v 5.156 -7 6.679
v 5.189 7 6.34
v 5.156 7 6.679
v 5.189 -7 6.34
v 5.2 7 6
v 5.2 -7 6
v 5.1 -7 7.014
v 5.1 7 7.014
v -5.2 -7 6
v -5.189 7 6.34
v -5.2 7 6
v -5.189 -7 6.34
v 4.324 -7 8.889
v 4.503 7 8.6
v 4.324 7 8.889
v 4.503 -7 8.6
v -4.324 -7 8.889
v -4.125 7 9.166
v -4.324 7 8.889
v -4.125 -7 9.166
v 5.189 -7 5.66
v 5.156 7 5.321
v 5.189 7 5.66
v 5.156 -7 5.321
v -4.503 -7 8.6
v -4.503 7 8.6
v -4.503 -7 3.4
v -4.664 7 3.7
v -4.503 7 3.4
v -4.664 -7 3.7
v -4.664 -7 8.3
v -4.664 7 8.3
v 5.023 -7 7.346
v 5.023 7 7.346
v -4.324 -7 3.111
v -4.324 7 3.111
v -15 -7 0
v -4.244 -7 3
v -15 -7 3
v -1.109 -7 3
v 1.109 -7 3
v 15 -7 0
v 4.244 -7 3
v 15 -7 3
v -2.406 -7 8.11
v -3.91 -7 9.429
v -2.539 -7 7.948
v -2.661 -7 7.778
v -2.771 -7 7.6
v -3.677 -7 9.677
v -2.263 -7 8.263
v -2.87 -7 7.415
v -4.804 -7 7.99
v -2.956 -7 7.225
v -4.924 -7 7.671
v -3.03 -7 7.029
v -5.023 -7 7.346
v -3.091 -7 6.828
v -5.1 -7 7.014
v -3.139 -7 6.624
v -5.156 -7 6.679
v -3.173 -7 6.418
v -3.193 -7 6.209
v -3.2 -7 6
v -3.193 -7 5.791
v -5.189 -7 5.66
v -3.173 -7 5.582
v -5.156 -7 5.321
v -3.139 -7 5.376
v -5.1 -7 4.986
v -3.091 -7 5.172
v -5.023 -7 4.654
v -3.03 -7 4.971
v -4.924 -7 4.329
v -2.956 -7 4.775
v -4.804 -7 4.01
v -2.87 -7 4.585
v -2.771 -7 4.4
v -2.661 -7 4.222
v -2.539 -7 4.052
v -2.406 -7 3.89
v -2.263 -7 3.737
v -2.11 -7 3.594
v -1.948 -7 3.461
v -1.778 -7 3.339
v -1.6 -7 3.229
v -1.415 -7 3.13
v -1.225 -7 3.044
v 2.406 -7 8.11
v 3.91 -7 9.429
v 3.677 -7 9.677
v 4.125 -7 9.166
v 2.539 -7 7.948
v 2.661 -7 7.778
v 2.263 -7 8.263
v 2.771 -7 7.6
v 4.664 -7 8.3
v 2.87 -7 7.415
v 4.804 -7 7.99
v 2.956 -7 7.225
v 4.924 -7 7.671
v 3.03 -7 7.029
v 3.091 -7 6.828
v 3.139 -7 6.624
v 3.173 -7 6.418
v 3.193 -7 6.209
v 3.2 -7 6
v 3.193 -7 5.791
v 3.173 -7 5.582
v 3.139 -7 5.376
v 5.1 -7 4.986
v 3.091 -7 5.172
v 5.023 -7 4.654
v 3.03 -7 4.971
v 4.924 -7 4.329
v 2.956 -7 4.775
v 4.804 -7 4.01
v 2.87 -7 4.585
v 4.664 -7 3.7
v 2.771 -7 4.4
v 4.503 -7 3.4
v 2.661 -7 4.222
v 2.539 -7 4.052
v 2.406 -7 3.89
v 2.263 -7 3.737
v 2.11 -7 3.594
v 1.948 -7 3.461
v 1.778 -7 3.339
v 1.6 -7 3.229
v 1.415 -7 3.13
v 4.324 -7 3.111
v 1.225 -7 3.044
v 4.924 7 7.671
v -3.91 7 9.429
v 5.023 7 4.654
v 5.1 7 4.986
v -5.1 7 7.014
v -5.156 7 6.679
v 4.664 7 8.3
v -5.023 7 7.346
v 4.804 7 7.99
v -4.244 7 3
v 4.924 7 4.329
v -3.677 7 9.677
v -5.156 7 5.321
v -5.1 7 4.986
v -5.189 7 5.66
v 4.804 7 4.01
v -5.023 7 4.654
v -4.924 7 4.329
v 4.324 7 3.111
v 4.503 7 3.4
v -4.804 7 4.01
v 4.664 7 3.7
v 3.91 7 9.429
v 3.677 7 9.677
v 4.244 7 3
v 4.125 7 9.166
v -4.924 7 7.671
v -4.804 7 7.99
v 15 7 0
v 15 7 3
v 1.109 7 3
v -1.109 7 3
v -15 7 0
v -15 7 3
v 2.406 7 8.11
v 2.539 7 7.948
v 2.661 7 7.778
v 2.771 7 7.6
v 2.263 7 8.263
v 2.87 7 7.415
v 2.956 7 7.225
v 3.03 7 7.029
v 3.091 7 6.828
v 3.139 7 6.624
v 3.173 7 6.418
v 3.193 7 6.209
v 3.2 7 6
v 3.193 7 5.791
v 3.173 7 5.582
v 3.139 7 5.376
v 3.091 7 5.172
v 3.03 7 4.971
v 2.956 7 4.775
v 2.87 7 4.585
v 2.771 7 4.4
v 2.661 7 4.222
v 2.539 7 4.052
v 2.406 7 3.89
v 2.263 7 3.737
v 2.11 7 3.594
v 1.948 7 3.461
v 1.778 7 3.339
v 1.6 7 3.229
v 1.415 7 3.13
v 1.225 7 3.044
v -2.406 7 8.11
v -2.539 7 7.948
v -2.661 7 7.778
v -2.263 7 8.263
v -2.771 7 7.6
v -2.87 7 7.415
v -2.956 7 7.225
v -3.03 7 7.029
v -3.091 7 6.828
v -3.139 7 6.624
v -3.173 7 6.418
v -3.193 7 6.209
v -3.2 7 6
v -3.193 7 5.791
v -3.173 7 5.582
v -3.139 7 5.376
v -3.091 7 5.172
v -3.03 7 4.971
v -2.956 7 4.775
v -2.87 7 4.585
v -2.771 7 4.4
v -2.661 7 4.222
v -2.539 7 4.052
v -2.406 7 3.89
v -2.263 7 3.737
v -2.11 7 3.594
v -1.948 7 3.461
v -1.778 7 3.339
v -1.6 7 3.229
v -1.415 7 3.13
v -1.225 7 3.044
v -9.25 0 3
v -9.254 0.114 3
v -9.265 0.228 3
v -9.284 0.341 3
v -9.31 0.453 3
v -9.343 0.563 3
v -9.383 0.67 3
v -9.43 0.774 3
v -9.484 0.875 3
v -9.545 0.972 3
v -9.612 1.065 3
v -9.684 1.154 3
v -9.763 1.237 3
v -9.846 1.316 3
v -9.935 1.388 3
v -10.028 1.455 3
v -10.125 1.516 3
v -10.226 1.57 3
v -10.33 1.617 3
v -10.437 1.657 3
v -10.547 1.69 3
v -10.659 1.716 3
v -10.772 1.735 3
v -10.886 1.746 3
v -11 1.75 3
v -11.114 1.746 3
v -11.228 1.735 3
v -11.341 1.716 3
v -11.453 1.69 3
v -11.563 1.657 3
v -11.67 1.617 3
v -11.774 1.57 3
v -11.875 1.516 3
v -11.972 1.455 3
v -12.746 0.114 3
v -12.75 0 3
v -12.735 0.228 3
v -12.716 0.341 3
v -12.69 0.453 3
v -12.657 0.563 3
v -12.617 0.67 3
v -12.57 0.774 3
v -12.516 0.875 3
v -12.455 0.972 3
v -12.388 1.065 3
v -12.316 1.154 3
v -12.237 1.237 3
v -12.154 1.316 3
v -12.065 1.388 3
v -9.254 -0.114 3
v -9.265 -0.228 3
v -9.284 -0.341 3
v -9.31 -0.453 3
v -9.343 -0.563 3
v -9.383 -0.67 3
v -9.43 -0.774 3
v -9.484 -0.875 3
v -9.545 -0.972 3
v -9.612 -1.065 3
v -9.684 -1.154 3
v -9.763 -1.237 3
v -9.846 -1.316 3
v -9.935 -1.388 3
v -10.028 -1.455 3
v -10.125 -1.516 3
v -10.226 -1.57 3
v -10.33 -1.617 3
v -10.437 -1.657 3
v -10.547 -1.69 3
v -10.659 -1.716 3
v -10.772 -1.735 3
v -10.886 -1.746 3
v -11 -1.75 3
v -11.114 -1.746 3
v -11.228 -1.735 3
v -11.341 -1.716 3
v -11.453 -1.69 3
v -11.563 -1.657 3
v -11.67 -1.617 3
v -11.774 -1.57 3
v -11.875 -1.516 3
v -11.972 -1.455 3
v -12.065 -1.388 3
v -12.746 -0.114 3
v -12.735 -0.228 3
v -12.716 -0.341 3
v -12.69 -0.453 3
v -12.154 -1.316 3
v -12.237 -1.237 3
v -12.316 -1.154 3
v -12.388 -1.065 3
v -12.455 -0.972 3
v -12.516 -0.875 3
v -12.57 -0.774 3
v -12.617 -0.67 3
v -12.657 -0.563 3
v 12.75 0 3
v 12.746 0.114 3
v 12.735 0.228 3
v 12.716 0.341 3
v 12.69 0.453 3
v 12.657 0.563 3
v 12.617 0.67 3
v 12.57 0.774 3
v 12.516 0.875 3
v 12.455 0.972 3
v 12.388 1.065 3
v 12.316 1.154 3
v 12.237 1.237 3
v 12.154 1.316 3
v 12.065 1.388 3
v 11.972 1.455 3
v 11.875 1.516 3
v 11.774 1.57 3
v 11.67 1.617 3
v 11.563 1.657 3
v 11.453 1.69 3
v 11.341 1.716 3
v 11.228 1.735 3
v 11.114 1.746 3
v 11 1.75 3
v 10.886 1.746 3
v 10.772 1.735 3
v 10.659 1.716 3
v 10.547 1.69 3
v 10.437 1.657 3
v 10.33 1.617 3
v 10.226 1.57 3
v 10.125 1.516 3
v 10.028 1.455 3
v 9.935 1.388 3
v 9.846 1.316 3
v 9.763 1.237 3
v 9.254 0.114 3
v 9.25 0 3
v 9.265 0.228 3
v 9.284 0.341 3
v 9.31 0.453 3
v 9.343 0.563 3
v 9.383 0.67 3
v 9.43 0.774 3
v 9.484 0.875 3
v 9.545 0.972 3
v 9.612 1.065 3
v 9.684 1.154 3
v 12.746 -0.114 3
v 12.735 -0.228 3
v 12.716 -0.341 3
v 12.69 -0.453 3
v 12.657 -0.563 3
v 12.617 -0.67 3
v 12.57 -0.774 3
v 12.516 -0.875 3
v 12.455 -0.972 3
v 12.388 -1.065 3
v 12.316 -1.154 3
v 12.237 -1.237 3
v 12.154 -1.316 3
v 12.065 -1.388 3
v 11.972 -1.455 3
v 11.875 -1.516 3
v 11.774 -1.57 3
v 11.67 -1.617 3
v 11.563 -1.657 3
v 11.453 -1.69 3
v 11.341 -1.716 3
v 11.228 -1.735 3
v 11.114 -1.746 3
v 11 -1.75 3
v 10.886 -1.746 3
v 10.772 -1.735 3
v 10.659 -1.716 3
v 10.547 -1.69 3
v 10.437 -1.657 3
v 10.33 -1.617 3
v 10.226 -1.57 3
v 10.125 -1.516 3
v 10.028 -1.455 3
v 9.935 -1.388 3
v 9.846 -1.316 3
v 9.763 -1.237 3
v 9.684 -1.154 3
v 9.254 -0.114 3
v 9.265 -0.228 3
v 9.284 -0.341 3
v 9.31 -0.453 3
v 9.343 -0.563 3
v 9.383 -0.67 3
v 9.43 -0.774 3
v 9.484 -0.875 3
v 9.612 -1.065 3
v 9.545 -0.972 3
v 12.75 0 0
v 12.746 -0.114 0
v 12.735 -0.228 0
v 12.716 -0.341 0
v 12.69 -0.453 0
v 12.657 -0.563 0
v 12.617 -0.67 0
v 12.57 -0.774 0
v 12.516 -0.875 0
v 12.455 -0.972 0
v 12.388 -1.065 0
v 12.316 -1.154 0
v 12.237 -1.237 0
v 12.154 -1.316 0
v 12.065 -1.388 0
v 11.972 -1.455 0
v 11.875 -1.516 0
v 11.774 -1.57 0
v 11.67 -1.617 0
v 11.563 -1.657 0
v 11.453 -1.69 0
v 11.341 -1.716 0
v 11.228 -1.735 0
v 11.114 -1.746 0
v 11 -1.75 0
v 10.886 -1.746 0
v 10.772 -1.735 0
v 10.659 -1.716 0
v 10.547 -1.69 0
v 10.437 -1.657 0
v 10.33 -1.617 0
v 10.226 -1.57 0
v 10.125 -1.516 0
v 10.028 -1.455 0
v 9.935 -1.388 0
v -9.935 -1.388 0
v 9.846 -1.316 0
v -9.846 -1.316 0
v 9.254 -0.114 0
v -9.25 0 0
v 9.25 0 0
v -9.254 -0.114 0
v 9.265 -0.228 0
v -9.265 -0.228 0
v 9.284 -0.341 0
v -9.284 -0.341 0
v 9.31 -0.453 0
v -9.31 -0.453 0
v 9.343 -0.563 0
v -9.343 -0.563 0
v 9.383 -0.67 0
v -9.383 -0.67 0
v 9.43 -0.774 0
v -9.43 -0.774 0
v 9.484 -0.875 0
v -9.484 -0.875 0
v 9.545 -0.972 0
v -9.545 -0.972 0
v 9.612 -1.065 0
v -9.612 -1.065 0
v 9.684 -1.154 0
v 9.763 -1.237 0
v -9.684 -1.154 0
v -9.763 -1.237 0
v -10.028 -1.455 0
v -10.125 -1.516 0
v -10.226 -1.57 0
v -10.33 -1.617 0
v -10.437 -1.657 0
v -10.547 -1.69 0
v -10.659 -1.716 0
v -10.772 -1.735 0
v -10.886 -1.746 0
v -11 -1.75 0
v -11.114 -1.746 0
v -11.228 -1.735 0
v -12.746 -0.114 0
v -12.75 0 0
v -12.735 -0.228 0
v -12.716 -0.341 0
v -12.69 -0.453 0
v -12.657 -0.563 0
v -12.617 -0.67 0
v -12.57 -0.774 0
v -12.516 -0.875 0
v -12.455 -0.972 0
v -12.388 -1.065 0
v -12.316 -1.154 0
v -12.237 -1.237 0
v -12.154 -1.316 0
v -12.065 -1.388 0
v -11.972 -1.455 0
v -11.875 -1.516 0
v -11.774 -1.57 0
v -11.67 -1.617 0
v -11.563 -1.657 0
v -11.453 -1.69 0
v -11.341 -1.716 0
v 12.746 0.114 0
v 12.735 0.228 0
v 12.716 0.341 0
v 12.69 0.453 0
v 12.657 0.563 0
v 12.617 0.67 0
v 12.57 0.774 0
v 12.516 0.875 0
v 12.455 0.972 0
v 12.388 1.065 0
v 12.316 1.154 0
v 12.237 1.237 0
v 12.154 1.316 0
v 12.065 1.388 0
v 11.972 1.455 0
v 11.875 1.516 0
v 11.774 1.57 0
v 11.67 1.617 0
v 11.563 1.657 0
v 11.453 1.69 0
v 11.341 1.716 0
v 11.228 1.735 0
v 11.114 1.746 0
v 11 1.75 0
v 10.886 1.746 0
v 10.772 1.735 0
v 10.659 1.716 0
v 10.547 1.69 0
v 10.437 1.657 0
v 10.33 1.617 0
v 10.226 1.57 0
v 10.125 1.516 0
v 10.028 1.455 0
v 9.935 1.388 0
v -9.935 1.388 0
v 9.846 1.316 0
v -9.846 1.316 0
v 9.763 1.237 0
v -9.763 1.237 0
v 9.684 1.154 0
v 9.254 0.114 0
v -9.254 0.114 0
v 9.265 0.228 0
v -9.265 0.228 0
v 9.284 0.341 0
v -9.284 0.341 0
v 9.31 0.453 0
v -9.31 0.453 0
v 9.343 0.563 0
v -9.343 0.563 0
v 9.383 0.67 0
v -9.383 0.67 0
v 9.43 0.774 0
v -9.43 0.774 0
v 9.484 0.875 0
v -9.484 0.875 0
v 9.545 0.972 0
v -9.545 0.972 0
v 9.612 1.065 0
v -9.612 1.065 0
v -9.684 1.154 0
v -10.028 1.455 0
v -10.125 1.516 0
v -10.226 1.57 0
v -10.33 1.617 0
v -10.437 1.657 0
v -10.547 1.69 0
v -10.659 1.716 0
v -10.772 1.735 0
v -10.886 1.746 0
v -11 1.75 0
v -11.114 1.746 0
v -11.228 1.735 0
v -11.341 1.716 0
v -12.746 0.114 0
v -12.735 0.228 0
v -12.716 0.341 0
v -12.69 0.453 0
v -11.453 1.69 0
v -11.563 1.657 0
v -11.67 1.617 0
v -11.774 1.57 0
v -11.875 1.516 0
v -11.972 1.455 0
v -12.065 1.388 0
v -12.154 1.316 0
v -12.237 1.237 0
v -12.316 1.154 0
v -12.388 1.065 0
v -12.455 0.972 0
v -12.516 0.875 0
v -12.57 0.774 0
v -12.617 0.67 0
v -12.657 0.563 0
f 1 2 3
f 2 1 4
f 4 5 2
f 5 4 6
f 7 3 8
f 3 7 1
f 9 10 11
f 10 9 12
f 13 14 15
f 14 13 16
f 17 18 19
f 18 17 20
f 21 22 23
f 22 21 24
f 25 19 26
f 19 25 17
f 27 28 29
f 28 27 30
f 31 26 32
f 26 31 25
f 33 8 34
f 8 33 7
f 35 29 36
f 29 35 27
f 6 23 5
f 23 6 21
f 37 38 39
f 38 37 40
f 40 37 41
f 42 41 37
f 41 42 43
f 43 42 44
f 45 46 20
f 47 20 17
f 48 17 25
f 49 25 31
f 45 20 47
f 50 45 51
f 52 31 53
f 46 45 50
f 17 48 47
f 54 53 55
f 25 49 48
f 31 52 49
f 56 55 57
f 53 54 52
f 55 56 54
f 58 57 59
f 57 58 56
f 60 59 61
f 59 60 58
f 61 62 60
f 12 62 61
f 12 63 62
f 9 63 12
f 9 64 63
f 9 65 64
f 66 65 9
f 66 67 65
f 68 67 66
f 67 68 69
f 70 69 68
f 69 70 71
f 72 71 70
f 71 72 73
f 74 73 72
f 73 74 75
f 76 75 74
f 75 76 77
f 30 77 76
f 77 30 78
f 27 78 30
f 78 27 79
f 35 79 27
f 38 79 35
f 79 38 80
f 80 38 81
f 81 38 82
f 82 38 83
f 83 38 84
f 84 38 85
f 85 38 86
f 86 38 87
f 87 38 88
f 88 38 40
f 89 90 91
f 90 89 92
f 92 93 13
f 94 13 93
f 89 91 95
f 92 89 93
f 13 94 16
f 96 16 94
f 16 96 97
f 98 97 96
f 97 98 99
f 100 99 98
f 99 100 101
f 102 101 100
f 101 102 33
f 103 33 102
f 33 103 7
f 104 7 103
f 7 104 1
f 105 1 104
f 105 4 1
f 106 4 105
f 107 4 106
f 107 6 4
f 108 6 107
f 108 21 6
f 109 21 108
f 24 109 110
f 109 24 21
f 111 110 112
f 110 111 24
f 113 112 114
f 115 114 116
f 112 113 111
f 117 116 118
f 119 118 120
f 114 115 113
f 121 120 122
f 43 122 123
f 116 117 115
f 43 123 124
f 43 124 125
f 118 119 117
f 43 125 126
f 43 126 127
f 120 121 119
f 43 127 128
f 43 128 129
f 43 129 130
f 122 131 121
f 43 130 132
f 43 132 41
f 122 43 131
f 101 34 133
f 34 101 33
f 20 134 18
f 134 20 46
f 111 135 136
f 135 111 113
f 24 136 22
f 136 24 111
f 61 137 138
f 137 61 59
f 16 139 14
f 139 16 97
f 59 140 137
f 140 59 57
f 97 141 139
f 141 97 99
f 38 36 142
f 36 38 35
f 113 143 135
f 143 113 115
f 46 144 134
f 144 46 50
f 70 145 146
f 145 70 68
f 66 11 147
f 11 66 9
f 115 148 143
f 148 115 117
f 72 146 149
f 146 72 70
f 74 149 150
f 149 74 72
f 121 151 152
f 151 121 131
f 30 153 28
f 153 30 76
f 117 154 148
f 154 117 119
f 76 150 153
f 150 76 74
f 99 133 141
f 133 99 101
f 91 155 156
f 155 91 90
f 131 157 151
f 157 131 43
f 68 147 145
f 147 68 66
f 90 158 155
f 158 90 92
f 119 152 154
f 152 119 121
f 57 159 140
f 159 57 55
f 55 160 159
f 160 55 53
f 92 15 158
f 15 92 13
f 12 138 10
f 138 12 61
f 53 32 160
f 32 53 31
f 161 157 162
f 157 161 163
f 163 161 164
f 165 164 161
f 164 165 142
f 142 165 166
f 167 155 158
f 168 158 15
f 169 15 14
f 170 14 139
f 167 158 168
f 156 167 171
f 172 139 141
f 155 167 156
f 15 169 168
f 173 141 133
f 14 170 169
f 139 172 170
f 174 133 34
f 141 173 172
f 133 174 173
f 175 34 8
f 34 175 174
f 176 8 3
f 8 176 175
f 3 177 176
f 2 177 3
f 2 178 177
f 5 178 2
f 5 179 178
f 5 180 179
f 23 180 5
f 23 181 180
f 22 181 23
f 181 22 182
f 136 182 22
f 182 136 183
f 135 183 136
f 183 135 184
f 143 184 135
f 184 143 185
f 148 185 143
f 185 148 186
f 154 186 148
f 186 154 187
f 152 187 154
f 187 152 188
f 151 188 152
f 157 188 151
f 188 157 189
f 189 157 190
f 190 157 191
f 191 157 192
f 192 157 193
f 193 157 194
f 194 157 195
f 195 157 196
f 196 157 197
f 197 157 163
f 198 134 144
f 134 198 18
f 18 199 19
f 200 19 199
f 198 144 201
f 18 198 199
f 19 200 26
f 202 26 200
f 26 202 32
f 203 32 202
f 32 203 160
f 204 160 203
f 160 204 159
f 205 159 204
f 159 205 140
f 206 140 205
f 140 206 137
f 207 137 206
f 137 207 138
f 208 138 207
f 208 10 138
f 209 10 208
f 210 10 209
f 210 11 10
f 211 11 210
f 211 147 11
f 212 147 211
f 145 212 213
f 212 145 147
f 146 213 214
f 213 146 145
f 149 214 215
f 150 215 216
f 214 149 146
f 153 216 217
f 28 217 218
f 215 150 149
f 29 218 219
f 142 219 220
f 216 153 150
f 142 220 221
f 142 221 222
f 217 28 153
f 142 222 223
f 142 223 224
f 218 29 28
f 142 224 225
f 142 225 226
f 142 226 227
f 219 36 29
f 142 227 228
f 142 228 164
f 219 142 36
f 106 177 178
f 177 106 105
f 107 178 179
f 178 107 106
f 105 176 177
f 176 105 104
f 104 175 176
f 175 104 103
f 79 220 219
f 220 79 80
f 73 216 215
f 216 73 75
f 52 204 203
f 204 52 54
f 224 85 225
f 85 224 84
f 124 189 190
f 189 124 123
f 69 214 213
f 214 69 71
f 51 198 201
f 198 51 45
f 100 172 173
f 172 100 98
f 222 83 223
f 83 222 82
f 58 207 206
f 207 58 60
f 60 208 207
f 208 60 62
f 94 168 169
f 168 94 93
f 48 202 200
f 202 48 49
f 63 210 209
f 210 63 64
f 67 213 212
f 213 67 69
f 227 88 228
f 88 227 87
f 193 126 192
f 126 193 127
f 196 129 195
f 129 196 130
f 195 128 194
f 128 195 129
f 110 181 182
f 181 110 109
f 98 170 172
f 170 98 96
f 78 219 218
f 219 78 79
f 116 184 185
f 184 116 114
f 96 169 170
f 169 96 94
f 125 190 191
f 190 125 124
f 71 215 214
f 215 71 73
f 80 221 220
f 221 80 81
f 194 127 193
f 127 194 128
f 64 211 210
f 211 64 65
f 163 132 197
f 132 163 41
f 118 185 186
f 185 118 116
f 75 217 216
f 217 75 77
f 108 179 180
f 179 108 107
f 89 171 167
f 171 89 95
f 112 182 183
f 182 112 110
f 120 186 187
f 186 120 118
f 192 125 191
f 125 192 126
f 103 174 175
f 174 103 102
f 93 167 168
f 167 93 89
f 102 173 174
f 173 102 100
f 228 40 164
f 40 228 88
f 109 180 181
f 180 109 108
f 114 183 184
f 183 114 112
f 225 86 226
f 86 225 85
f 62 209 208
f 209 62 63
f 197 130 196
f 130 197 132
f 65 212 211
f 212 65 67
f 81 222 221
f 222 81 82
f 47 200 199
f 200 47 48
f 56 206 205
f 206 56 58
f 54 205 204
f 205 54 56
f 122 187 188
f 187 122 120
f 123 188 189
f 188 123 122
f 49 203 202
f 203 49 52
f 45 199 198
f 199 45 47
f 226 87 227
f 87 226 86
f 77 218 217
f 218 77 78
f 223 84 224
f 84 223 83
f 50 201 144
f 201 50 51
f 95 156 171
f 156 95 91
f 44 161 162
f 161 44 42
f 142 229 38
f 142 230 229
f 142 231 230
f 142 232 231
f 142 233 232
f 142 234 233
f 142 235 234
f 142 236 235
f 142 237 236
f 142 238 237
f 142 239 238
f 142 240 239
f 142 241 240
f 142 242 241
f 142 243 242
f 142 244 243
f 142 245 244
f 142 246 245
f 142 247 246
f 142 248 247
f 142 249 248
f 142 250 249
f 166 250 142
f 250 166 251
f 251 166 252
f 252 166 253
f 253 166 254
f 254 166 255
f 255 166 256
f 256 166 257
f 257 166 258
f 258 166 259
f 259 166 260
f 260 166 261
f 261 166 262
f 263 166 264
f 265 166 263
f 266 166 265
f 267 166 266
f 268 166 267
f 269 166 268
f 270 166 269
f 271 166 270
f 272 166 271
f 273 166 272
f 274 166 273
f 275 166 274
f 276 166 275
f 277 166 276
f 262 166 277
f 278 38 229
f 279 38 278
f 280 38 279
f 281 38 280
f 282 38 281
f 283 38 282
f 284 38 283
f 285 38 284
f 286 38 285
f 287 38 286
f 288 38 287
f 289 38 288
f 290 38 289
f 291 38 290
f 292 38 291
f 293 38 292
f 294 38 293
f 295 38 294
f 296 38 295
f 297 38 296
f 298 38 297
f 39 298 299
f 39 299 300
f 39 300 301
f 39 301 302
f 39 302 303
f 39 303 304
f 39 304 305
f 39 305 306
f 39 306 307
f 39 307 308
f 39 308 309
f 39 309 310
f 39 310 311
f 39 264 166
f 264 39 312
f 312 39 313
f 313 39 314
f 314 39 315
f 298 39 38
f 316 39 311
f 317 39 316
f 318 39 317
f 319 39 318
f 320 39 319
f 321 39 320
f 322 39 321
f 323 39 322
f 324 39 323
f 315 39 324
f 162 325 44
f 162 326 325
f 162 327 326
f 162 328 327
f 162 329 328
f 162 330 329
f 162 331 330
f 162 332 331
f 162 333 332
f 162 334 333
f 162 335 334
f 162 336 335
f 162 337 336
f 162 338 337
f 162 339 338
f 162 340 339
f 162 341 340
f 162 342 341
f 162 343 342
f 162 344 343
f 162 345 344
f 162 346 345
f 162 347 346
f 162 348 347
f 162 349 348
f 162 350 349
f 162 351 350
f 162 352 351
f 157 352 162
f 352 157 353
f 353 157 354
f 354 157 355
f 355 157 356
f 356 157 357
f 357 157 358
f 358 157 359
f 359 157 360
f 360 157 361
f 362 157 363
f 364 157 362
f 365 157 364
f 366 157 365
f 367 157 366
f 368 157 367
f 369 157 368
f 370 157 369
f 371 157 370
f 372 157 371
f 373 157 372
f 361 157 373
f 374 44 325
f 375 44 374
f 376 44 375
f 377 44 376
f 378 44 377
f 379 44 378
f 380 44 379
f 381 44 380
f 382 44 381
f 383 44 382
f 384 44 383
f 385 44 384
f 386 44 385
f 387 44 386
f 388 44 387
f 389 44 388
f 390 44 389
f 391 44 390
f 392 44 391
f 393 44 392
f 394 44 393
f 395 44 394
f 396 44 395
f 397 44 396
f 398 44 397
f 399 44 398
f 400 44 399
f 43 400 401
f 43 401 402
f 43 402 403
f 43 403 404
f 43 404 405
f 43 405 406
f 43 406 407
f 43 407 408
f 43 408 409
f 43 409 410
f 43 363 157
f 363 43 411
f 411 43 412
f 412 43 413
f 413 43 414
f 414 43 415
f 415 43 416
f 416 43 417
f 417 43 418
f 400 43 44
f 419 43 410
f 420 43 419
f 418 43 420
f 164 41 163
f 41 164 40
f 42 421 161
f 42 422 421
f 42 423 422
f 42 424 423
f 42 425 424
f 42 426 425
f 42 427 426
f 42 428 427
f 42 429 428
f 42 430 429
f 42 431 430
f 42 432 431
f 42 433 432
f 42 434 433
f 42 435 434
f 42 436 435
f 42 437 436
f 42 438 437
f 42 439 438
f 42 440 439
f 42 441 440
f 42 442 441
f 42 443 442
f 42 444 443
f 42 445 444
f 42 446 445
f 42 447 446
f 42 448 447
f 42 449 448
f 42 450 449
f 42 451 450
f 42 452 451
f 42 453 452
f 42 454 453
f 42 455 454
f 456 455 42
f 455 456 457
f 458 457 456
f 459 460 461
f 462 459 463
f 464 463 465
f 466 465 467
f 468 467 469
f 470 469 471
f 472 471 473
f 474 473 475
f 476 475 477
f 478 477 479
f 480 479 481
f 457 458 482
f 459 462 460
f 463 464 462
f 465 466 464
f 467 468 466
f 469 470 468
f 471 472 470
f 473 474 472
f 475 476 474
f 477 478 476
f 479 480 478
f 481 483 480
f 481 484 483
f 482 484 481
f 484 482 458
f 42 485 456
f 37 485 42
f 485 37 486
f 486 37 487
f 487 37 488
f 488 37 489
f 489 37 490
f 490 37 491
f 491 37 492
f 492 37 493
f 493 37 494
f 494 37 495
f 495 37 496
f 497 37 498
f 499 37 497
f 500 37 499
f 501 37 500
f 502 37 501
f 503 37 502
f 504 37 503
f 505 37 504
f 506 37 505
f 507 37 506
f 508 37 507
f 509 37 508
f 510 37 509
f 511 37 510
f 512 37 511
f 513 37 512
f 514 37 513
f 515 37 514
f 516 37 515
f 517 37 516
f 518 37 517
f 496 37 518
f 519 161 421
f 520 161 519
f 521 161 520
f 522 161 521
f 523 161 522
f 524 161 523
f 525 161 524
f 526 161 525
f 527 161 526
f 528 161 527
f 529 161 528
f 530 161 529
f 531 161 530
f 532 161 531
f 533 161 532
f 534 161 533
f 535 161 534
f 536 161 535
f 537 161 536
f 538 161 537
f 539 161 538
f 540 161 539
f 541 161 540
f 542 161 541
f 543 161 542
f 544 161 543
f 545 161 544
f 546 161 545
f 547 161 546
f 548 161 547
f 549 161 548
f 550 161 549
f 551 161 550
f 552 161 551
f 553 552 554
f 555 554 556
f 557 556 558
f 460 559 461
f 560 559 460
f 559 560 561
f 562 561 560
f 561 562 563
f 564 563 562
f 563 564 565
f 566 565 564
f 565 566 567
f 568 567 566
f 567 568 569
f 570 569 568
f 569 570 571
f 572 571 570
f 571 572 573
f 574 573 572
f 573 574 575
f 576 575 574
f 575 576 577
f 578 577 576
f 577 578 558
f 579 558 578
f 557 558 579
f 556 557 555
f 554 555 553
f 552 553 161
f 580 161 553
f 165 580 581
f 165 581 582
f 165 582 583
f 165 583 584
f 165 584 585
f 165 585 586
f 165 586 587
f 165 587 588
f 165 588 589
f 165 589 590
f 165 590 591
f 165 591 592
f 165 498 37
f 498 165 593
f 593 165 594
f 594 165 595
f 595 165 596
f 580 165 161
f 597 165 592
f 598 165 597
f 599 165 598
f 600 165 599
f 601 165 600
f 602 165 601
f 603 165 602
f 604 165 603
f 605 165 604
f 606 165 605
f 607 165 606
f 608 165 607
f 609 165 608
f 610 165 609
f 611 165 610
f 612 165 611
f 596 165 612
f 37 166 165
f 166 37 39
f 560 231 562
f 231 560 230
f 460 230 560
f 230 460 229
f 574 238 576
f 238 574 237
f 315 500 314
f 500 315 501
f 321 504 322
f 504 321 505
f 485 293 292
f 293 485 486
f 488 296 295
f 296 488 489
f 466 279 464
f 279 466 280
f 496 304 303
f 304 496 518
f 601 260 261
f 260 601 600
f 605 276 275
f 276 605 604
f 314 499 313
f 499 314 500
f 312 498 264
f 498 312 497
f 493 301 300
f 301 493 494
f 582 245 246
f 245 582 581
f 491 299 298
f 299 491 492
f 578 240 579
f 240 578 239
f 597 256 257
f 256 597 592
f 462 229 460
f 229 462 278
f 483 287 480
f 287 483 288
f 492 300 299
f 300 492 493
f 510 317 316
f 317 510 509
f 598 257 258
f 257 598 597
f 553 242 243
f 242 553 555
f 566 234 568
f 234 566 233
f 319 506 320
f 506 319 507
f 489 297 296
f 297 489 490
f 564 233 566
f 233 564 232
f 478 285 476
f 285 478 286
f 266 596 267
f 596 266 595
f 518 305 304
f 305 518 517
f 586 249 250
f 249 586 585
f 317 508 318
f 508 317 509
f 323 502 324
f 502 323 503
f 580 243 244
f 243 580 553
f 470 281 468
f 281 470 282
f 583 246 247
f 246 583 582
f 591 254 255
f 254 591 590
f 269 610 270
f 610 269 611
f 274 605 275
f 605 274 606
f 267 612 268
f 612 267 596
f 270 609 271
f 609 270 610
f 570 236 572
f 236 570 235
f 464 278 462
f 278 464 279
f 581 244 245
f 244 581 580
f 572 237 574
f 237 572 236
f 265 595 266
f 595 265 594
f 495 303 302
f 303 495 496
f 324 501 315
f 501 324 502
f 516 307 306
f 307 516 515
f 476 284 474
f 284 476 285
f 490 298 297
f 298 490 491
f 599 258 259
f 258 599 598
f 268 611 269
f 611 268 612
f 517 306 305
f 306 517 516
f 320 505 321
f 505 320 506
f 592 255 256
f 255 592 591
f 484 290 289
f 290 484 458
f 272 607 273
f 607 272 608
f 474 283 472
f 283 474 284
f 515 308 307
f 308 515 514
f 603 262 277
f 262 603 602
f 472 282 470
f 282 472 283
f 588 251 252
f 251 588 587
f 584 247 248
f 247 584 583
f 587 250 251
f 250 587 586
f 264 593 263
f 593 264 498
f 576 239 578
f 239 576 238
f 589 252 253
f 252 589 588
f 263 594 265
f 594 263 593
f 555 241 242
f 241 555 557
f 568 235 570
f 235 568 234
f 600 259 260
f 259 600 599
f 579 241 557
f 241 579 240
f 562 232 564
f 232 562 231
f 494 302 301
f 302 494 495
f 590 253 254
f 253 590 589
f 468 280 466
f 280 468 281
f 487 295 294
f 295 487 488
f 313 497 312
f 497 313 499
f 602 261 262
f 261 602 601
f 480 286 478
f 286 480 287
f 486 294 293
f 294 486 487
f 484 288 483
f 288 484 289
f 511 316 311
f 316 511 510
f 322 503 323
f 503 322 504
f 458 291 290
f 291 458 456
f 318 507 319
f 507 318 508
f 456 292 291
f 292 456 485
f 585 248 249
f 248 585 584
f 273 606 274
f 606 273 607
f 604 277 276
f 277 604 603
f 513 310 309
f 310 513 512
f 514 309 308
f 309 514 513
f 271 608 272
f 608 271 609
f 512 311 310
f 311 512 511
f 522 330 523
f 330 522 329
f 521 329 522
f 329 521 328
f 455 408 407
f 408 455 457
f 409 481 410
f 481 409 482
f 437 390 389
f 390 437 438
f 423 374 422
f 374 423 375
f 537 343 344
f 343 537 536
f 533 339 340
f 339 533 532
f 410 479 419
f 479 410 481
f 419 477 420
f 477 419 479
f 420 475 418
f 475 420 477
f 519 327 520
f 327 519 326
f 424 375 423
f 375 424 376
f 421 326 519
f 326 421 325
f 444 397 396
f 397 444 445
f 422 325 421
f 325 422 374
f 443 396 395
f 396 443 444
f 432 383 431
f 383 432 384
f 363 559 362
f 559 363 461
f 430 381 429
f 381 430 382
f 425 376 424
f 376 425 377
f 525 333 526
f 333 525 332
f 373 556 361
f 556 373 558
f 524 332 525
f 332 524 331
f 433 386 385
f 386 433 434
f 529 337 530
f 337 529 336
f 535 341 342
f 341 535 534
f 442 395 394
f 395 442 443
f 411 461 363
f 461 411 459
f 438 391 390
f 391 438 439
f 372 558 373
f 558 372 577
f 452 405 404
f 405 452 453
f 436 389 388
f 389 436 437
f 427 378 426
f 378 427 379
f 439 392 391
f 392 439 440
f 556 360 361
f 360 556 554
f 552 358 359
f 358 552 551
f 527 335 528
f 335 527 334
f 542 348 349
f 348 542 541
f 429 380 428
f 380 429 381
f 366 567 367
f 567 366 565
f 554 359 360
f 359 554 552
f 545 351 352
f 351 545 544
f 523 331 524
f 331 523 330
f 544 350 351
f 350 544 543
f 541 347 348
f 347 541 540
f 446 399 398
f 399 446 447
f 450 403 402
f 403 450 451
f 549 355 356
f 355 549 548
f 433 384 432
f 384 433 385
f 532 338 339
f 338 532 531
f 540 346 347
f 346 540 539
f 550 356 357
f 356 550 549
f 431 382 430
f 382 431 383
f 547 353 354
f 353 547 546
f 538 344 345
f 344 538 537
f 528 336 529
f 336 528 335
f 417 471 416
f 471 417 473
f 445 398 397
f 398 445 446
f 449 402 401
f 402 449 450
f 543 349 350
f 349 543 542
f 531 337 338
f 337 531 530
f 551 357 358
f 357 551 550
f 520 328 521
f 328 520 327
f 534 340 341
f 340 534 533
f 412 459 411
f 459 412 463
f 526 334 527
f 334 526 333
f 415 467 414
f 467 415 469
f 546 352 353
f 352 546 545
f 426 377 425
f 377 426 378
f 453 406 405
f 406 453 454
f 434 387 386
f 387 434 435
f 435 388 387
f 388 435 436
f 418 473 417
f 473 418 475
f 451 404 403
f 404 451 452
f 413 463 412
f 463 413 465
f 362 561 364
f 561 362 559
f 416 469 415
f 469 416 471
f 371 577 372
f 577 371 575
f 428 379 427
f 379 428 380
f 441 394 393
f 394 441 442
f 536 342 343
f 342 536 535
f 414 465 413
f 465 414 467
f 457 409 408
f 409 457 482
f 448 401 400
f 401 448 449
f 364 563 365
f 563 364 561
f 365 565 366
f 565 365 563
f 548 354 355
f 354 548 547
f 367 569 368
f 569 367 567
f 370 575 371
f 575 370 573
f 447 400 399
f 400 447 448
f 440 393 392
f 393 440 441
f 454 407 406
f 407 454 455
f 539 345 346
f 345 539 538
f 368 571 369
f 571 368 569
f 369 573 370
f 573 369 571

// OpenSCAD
cable_diameter = 6; clearance = 0.2; wall_thickness = 2;
base_length = 30; base_width = 14; base_thickness = 3;
screw_hole_diameter = 3.5; screw_hole_x = 11;
collar_axis_z = 6; gap_angle = 90;
inner_r = cable_diameter/2 + clearance; outer_r = inner_r + wall_thickness;
$fn = 96;
difference() {
  union() {
    translate([-base_length/2, -base_width/2, 0]) cube([base_length, base_width, base_thickness]);
    // collar: axis along Y at (X=0, Z=collar_axis_z), 90 deg gap centred on +Z
    translate([0, 0, collar_axis_z]) rotate([90, 0, 0]) difference() {
      cylinder(r = outer_r, h = base_width, center = true);
      cylinder(r = inner_r, h = base_width + 2, center = true);
      // gap wedge: +/-45 deg about the local +Y (= world +Z)
      linear_extrude(base_width + 2, center = true)
        polygon([[0, 0], [2*outer_r*sin(gap_angle/2), 2*outer_r*cos(gap_angle/2)],
                 [-2*outer_r*sin(gap_angle/2), 2*outer_r*cos(gap_angle/2)]]);
    }
  }
  for (x = [-screw_hole_x, screw_hole_x])
    translate([x, 0, -1]) cylinder(d = screw_hole_diameter, h = base_thickness + 2);
}
